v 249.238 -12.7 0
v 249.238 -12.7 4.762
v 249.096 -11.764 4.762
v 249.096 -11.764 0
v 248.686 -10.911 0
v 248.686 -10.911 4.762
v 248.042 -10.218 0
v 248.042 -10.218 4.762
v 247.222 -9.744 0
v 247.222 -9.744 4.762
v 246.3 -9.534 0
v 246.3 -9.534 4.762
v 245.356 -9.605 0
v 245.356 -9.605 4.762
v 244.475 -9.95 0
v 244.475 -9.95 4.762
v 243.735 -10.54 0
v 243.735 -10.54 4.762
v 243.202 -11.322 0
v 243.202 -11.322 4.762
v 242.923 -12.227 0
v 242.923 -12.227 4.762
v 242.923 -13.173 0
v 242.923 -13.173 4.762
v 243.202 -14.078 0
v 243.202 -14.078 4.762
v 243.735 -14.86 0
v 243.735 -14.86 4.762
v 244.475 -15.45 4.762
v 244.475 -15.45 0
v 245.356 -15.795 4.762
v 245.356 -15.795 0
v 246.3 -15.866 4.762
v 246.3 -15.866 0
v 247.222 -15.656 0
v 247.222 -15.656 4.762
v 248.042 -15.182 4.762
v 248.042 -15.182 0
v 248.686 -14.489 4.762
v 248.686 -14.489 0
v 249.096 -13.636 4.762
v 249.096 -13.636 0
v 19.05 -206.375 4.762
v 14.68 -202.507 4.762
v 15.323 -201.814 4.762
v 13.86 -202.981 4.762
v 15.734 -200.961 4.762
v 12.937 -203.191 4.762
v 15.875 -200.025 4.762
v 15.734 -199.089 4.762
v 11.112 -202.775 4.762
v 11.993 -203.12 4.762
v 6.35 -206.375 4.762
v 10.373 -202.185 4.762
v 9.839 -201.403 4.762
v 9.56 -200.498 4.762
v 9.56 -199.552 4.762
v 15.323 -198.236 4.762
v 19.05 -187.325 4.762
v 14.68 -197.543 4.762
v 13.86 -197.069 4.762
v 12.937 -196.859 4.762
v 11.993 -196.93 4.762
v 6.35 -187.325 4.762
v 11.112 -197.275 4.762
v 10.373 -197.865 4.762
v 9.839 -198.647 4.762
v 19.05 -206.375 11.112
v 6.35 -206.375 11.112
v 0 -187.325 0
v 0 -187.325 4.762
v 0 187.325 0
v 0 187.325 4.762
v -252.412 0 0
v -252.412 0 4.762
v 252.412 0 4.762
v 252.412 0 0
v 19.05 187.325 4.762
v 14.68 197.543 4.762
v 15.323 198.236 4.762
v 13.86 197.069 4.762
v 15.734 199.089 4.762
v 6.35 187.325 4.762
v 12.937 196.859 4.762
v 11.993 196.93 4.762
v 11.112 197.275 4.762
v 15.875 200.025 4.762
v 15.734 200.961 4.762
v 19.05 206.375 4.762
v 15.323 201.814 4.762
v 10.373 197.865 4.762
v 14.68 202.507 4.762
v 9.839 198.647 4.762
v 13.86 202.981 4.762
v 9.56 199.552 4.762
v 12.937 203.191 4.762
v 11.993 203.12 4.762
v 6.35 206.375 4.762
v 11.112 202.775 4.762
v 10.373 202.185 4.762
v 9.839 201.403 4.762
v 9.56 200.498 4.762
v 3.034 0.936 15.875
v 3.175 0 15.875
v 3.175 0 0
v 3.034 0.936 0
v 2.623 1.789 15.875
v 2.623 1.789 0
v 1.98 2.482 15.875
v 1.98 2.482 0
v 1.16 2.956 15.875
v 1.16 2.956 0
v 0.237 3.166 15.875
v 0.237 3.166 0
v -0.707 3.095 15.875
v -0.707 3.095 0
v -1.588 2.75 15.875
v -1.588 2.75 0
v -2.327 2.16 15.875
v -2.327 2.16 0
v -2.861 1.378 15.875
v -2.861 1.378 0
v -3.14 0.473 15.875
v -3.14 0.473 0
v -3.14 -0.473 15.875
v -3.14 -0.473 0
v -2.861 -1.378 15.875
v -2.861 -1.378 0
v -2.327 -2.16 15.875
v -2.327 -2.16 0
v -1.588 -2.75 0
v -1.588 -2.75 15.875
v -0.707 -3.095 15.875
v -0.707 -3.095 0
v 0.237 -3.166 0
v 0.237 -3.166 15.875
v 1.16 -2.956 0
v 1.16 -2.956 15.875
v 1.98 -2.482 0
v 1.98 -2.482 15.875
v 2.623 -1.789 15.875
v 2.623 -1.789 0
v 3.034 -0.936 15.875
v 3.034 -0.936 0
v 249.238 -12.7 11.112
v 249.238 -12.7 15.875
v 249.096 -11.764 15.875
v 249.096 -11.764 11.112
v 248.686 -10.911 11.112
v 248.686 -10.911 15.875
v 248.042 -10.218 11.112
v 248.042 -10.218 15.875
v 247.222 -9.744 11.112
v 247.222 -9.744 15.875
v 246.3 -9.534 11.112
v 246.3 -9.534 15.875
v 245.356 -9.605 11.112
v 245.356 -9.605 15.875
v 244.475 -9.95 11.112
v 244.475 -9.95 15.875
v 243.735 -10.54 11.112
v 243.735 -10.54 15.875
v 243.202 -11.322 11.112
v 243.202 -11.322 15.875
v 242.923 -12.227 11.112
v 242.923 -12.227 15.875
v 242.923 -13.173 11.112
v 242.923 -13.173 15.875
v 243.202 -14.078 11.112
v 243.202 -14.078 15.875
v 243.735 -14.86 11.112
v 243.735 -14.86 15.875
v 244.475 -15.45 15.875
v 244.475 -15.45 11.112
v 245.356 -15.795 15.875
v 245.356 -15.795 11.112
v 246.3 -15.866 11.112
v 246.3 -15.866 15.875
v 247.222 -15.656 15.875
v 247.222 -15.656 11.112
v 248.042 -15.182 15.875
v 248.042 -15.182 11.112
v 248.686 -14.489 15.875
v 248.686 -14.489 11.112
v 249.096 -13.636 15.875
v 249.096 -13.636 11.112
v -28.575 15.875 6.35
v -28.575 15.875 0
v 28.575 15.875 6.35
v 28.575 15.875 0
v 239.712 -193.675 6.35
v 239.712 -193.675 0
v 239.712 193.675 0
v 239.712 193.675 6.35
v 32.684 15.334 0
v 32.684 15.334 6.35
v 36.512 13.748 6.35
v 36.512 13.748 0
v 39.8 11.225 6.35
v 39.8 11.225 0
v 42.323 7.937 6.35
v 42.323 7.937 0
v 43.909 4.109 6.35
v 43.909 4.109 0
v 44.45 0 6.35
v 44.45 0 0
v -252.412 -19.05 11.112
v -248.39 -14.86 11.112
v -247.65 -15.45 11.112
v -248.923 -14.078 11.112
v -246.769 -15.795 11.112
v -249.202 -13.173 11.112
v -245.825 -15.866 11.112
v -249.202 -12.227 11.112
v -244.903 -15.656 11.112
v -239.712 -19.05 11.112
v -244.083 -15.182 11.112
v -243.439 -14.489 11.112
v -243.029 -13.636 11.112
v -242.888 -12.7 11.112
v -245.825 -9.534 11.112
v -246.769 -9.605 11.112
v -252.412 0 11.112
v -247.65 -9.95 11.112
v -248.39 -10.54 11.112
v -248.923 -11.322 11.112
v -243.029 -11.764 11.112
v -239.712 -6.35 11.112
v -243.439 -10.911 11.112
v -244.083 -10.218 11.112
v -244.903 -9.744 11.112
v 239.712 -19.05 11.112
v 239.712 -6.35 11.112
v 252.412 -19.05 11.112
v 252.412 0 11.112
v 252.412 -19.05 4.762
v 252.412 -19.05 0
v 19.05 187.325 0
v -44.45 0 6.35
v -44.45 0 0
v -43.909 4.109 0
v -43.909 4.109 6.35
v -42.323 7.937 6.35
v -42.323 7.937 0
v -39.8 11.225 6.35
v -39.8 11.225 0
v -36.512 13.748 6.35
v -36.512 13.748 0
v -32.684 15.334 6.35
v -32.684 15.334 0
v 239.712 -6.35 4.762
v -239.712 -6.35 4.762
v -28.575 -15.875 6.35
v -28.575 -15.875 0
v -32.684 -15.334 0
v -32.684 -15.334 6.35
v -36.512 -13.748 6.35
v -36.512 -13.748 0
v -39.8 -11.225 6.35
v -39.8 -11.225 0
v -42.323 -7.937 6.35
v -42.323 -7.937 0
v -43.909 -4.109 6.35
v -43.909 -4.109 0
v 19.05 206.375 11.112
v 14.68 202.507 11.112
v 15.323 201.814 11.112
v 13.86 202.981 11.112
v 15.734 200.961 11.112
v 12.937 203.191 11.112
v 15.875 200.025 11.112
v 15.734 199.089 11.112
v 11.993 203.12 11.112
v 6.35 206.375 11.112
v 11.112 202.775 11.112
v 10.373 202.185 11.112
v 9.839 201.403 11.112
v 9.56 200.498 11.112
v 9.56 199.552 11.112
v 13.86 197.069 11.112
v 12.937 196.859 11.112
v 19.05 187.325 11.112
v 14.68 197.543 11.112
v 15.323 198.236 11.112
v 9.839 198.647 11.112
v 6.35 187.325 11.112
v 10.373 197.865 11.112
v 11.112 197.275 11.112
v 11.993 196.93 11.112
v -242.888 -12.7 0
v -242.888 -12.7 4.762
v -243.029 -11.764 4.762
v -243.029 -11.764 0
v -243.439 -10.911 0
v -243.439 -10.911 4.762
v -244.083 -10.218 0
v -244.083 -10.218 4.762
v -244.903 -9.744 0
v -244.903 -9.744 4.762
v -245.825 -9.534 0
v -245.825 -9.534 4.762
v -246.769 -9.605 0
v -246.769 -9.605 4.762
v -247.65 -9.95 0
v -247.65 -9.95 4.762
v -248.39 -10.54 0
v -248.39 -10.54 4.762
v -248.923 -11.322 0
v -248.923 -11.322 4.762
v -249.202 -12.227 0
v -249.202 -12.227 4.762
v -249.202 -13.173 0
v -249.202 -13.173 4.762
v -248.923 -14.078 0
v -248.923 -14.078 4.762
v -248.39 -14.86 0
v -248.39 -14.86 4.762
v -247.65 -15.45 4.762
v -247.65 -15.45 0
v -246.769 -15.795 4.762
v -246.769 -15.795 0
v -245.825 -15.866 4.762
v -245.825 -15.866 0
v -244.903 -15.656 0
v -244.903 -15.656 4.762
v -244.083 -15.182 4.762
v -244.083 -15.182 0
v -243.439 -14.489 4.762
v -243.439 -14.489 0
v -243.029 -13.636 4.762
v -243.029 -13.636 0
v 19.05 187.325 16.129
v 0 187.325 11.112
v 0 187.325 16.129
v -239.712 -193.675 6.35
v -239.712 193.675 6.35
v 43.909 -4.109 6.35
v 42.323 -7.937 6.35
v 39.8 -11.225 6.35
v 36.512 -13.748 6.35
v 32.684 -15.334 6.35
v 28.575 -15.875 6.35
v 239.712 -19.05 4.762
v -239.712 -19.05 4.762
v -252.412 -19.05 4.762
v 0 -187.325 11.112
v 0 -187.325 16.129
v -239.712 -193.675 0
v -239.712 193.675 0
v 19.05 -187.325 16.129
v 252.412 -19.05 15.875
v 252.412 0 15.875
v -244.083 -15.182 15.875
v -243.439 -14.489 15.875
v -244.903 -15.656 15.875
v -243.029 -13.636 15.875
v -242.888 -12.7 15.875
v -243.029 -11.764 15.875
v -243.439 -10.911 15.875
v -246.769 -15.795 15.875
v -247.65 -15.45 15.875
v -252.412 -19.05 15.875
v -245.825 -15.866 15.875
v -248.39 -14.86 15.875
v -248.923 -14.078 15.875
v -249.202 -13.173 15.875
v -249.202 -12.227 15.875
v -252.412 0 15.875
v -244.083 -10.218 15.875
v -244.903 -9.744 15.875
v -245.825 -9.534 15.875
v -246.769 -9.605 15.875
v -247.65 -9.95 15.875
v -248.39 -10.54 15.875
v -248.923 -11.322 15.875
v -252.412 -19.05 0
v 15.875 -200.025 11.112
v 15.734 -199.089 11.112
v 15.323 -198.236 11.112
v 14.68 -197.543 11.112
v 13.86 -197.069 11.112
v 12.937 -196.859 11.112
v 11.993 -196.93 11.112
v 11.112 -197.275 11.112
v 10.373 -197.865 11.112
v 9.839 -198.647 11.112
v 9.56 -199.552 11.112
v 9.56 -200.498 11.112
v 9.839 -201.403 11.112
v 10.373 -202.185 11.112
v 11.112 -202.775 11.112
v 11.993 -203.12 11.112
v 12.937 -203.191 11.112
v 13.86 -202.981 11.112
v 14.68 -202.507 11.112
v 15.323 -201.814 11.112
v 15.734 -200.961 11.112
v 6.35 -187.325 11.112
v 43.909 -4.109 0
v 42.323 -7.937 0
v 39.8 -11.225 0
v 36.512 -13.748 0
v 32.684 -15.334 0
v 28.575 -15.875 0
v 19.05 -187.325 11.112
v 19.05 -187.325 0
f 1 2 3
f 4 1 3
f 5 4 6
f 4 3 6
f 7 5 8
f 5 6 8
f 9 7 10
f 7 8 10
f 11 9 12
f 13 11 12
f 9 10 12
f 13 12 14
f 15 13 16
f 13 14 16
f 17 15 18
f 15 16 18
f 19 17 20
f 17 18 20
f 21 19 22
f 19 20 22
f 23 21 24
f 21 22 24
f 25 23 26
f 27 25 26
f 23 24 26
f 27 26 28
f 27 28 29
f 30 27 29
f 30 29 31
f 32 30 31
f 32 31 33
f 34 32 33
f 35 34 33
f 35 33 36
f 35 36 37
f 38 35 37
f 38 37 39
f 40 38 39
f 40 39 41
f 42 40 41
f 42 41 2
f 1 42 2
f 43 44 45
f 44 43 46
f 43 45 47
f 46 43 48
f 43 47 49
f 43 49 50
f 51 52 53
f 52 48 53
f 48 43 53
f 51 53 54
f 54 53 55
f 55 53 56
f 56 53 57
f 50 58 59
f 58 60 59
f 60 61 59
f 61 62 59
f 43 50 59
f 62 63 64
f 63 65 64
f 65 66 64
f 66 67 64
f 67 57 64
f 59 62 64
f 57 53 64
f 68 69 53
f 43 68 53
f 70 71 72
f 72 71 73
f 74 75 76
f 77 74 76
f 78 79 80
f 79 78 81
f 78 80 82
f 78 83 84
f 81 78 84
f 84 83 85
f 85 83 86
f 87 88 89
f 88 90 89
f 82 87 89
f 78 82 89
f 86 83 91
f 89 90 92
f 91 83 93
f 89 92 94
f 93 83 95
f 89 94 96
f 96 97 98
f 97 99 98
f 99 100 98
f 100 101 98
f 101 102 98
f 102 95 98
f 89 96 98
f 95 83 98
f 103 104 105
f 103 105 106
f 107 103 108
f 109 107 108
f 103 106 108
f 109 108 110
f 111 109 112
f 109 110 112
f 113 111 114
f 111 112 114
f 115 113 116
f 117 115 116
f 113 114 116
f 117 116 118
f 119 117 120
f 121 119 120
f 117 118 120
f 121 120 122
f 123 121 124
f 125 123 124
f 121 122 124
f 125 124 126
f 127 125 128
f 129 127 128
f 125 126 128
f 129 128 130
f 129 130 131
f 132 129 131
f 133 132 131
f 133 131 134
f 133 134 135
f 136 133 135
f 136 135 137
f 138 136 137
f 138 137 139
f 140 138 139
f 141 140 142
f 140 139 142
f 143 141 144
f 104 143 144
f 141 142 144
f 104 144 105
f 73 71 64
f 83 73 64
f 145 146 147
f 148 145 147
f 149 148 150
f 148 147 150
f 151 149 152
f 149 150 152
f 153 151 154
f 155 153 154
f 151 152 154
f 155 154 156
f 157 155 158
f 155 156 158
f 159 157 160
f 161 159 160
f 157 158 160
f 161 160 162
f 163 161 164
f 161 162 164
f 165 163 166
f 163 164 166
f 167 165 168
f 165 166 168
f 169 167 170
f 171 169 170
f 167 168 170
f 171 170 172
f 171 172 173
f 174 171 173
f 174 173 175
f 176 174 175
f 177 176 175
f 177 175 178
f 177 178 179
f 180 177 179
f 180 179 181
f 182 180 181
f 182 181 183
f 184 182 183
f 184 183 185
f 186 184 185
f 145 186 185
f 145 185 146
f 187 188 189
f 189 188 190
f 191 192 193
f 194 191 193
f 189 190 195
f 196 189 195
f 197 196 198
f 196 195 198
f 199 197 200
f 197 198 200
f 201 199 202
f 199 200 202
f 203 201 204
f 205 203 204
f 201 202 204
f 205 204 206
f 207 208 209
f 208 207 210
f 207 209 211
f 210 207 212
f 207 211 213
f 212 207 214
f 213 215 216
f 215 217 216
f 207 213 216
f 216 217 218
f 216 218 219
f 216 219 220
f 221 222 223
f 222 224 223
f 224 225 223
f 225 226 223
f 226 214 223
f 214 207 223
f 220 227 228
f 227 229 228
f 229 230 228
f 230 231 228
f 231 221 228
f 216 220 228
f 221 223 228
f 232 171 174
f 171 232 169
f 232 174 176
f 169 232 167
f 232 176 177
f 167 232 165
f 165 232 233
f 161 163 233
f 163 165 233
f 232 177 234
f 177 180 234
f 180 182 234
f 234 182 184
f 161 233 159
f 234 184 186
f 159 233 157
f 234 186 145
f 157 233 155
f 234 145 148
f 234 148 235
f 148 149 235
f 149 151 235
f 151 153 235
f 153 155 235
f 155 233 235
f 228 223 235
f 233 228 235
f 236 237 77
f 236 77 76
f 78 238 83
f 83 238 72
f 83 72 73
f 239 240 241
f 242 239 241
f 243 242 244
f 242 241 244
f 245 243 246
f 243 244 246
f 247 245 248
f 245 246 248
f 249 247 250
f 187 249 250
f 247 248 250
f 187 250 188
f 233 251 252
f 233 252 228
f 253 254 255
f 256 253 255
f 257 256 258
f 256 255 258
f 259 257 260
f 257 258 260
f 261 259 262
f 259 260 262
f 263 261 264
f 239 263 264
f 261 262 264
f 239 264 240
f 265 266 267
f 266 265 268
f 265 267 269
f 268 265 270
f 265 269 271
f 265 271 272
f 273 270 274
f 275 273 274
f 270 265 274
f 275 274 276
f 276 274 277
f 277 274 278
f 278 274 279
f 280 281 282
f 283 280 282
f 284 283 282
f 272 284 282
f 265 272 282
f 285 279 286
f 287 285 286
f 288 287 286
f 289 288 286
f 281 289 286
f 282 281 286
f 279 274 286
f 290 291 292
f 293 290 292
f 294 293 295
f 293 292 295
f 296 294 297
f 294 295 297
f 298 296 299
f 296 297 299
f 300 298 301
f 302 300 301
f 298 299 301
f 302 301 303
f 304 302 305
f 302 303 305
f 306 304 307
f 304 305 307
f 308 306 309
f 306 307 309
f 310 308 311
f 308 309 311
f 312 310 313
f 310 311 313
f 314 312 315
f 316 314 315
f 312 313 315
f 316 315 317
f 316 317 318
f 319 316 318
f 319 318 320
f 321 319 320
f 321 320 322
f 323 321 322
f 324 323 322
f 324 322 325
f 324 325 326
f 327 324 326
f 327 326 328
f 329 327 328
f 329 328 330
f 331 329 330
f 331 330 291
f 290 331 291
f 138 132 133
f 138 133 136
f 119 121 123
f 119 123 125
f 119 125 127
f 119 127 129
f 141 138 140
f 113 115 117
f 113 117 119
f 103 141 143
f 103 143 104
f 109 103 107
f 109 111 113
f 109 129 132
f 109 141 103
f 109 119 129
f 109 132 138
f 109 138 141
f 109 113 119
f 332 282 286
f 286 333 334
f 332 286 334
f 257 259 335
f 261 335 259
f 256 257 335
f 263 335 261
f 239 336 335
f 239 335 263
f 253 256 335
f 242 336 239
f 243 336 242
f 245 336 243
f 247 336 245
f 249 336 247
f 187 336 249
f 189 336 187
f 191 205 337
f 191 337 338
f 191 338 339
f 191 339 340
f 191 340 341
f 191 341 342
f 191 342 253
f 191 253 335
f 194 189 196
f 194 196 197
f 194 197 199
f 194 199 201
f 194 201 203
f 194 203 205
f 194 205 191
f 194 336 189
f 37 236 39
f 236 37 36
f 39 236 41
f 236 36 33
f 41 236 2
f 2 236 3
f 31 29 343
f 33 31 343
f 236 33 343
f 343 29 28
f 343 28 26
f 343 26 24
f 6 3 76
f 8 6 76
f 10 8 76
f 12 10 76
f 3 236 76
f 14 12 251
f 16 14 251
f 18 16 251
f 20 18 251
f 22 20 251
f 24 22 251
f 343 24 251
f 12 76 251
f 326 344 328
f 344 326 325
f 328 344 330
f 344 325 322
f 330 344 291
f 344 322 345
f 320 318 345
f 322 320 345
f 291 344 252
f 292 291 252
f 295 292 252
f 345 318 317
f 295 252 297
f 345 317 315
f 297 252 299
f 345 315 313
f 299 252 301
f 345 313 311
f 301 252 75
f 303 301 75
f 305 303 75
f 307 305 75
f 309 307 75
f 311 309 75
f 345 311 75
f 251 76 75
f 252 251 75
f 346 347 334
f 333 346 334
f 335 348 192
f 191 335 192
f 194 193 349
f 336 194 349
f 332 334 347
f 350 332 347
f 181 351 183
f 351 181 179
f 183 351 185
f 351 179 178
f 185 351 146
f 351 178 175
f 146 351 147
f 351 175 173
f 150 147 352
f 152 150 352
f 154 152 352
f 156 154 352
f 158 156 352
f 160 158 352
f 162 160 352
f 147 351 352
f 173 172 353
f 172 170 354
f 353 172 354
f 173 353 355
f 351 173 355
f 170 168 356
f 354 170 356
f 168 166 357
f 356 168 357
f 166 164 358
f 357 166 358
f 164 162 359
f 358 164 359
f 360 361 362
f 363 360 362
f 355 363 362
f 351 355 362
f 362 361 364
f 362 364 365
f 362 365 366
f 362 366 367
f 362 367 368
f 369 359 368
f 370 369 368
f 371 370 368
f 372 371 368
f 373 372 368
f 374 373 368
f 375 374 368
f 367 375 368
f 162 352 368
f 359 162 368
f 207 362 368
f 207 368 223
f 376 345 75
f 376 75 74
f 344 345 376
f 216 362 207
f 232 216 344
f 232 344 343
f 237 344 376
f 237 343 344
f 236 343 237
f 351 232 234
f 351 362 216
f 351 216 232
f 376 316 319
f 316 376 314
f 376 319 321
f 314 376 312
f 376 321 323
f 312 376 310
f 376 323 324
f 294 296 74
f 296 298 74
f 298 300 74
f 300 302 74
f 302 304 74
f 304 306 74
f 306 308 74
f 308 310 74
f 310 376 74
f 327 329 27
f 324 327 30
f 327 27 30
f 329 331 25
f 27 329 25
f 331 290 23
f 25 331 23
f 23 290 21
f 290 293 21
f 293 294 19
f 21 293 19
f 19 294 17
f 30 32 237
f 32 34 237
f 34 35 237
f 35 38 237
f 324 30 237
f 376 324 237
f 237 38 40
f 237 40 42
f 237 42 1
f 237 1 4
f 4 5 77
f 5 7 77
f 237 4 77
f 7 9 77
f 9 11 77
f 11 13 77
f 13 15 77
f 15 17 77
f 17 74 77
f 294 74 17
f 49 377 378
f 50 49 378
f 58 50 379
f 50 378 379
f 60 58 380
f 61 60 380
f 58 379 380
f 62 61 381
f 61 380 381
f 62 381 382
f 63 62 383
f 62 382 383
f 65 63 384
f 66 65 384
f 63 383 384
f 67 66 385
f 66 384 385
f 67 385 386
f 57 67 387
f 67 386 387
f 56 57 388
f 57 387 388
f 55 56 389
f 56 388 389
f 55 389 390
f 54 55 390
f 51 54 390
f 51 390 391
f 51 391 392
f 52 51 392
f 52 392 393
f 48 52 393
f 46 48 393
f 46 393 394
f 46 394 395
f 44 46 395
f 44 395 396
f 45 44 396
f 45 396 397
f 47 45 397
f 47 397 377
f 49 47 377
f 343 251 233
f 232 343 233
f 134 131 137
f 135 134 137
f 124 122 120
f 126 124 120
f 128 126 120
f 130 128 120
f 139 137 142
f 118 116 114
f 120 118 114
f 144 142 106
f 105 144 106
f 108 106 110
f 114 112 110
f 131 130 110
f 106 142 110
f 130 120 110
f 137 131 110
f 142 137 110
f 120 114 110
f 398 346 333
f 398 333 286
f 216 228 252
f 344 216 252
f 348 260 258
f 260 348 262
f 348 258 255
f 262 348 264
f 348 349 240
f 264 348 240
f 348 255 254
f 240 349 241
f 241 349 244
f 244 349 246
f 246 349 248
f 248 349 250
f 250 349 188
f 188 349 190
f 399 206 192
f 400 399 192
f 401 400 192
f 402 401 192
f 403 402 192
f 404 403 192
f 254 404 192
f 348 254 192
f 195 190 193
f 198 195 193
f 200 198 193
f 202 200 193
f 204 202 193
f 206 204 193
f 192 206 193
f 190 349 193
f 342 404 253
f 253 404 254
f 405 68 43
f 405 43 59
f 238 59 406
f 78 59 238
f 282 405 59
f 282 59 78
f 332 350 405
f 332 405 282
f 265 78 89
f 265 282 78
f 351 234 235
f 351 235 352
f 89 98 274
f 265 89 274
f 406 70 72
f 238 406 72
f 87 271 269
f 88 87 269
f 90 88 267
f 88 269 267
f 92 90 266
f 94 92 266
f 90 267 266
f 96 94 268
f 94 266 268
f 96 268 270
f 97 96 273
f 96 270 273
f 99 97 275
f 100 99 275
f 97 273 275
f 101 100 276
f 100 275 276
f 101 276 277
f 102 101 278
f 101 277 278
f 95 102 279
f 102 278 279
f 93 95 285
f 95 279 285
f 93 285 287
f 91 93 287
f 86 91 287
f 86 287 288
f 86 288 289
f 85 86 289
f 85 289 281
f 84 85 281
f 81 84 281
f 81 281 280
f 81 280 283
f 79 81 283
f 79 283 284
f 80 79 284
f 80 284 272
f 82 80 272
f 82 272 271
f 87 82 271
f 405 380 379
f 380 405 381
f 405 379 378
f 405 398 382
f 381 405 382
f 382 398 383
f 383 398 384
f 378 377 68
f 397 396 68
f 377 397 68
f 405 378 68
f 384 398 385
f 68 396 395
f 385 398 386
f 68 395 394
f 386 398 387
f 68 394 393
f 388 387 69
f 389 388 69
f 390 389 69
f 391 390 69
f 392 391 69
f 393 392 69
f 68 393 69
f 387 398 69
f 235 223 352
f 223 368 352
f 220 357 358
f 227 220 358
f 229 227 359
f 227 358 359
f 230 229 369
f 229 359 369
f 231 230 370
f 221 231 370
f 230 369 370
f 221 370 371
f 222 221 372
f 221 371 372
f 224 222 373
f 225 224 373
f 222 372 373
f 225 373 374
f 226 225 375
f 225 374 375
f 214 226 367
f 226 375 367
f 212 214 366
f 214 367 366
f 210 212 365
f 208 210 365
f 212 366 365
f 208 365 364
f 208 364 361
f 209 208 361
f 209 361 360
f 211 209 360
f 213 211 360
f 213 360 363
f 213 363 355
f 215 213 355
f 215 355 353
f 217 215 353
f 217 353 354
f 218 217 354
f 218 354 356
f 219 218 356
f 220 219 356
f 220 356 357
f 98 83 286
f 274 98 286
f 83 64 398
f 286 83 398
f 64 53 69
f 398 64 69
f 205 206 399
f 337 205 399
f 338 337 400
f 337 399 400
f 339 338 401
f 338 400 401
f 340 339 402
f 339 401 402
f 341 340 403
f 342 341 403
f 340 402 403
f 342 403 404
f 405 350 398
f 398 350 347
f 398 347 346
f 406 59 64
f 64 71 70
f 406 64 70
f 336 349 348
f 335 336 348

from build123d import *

# Parameters (mm, degrees)
F1_DEPTH  = 19.05
F2_W      = 6.35
F2_H      = 6.35
F3_DEPTH  = 492.126
F4_R      = 3.175
F5_DEPTH  = 15.876
F7_DEPTH  = 19.05
F8_R      = 3.175
F9_DEPTH  = 11.1135
F10_W     = 6.35
F10_H     = 6.35
F11_DEPTH = 412.751
F13_DEPTH = 6.35
F14_R     = 3.175
F15_DEPTH = 15.875


with BuildPart() as f1:
    # F0 (on Front) → F1 (new body)
    with BuildSketch(Plane.XZ):
        Polygon((-252.4125, 0), (0, 0), (252.4125, 0), (252.4125, 4.7625), (239.7125, 4.7625), (239.7125, 11.1125), (252.4125, 11.1125), (252.4125, 15.875), (0, 15.875), (-252.4125, 15.875), (-252.4125, 11.1125), (-239.7125, 11.1125), (-239.7125, 4.7625), (-252.4125, 4.7625), align=None)
    extrude(amount=F1_DEPTH)

    # F2 (on face) → F3 (cut, through all)
    with BuildSketch(Plane.YZ.offset(239.7125)):
        with Locations((-3.175, 7.9375)):
            Rectangle(F2_W, F2_H)
    extrude(amount=-F3_DEPTH, mode=Mode.SUBTRACT)

    # F4 (on face) → F5 (cut, through all)
    with BuildSketch(Plane.XY.offset(15.875)):
        with Locations((-246.0625, -12.7)):
            Circle(F4_R)
        with Locations((246.0625, -12.7)):
            Circle(F4_R)
    extrude(amount=-F5_DEPTH, mode=Mode.SUBTRACT)


with BuildPart() as f7:
    # F6 (on Right) → F7 (new body)
    with BuildSketch(Plane.YZ):
        Polygon((-187.325, 0), (0, 0), (187.325, 0), (187.325, 4.7625), (206.375, 4.7625), (206.375, 11.1125), (187.325, 11.1125), (187.325, 16.129), (0, 16.129), (-187.325, 16.129), (-187.325, 11.1125), (-206.375, 11.1125), (-206.375, 4.7625), (-187.325, 4.7625), align=None)
    extrude(amount=F7_DEPTH)

    # F8 (on face) → F9 (cut, through all)
    with BuildSketch(Plane.XY.offset(11.1125)):
        with Locations((12.7, 200.025)):
            Circle(F8_R)
        with Locations((12.7, -200.025)):
            Circle(F8_R)
    extrude(amount=-F9_DEPTH, mode=Mode.SUBTRACT)

    # F10 (on face) → F11 (cut, through all)
    with BuildSketch(Plane.XZ.offset(206.375)):
        with Locations((3.175, 7.9375)):
            Rectangle(F10_W, F10_H)
    extrude(amount=-F11_DEPTH, mode=Mode.SUBTRACT)


with BuildPart() as f13:
    # F12 (on Top) → F13 (new body)
    with BuildSketch(Plane.XY):
        Polygon((239.7125, 193.675), (0, 193.675), (-239.7125, 193.675), (-239.7125, 0), (-239.7125, -193.675), (0, -193.675), (239.7125, -193.675), (239.7125, 0), align=None)
        with BuildLine():
            Line((-28.575, 15.875), (0, 15.875))
            Line((0, 15.875), (28.575, 15.875))
            ThreePointArc((28.575, 15.875), (39.8003201513, 11.2253201513), (44.45, 0))
            ThreePointArc((44.45, 0), (39.8003201513, -11.2253201513), (28.575, -15.875))
            Line((28.575, -15.875), (0, -15.875))
            Line((0, -15.875), (-28.575, -15.875))
            ThreePointArc((-28.575, -15.875), (-39.8003201513, -11.2253201513), (-44.45, 0))
            ThreePointArc((-44.45, 0), (-39.8003201513, 11.2253201513), (-28.575, 15.875))
        make_face(mode=Mode.SUBTRACT)
    extrude(amount=F13_DEPTH)


with BuildPart() as f15:
    # F14 (on Top) → F15 (new body)
    with BuildSketch(Plane.XY):
        Circle(F14_R)
    extrude(amount=F15_DEPTH)


solid = Compound([f1.part, f7.part, f13.part, f15.part])
